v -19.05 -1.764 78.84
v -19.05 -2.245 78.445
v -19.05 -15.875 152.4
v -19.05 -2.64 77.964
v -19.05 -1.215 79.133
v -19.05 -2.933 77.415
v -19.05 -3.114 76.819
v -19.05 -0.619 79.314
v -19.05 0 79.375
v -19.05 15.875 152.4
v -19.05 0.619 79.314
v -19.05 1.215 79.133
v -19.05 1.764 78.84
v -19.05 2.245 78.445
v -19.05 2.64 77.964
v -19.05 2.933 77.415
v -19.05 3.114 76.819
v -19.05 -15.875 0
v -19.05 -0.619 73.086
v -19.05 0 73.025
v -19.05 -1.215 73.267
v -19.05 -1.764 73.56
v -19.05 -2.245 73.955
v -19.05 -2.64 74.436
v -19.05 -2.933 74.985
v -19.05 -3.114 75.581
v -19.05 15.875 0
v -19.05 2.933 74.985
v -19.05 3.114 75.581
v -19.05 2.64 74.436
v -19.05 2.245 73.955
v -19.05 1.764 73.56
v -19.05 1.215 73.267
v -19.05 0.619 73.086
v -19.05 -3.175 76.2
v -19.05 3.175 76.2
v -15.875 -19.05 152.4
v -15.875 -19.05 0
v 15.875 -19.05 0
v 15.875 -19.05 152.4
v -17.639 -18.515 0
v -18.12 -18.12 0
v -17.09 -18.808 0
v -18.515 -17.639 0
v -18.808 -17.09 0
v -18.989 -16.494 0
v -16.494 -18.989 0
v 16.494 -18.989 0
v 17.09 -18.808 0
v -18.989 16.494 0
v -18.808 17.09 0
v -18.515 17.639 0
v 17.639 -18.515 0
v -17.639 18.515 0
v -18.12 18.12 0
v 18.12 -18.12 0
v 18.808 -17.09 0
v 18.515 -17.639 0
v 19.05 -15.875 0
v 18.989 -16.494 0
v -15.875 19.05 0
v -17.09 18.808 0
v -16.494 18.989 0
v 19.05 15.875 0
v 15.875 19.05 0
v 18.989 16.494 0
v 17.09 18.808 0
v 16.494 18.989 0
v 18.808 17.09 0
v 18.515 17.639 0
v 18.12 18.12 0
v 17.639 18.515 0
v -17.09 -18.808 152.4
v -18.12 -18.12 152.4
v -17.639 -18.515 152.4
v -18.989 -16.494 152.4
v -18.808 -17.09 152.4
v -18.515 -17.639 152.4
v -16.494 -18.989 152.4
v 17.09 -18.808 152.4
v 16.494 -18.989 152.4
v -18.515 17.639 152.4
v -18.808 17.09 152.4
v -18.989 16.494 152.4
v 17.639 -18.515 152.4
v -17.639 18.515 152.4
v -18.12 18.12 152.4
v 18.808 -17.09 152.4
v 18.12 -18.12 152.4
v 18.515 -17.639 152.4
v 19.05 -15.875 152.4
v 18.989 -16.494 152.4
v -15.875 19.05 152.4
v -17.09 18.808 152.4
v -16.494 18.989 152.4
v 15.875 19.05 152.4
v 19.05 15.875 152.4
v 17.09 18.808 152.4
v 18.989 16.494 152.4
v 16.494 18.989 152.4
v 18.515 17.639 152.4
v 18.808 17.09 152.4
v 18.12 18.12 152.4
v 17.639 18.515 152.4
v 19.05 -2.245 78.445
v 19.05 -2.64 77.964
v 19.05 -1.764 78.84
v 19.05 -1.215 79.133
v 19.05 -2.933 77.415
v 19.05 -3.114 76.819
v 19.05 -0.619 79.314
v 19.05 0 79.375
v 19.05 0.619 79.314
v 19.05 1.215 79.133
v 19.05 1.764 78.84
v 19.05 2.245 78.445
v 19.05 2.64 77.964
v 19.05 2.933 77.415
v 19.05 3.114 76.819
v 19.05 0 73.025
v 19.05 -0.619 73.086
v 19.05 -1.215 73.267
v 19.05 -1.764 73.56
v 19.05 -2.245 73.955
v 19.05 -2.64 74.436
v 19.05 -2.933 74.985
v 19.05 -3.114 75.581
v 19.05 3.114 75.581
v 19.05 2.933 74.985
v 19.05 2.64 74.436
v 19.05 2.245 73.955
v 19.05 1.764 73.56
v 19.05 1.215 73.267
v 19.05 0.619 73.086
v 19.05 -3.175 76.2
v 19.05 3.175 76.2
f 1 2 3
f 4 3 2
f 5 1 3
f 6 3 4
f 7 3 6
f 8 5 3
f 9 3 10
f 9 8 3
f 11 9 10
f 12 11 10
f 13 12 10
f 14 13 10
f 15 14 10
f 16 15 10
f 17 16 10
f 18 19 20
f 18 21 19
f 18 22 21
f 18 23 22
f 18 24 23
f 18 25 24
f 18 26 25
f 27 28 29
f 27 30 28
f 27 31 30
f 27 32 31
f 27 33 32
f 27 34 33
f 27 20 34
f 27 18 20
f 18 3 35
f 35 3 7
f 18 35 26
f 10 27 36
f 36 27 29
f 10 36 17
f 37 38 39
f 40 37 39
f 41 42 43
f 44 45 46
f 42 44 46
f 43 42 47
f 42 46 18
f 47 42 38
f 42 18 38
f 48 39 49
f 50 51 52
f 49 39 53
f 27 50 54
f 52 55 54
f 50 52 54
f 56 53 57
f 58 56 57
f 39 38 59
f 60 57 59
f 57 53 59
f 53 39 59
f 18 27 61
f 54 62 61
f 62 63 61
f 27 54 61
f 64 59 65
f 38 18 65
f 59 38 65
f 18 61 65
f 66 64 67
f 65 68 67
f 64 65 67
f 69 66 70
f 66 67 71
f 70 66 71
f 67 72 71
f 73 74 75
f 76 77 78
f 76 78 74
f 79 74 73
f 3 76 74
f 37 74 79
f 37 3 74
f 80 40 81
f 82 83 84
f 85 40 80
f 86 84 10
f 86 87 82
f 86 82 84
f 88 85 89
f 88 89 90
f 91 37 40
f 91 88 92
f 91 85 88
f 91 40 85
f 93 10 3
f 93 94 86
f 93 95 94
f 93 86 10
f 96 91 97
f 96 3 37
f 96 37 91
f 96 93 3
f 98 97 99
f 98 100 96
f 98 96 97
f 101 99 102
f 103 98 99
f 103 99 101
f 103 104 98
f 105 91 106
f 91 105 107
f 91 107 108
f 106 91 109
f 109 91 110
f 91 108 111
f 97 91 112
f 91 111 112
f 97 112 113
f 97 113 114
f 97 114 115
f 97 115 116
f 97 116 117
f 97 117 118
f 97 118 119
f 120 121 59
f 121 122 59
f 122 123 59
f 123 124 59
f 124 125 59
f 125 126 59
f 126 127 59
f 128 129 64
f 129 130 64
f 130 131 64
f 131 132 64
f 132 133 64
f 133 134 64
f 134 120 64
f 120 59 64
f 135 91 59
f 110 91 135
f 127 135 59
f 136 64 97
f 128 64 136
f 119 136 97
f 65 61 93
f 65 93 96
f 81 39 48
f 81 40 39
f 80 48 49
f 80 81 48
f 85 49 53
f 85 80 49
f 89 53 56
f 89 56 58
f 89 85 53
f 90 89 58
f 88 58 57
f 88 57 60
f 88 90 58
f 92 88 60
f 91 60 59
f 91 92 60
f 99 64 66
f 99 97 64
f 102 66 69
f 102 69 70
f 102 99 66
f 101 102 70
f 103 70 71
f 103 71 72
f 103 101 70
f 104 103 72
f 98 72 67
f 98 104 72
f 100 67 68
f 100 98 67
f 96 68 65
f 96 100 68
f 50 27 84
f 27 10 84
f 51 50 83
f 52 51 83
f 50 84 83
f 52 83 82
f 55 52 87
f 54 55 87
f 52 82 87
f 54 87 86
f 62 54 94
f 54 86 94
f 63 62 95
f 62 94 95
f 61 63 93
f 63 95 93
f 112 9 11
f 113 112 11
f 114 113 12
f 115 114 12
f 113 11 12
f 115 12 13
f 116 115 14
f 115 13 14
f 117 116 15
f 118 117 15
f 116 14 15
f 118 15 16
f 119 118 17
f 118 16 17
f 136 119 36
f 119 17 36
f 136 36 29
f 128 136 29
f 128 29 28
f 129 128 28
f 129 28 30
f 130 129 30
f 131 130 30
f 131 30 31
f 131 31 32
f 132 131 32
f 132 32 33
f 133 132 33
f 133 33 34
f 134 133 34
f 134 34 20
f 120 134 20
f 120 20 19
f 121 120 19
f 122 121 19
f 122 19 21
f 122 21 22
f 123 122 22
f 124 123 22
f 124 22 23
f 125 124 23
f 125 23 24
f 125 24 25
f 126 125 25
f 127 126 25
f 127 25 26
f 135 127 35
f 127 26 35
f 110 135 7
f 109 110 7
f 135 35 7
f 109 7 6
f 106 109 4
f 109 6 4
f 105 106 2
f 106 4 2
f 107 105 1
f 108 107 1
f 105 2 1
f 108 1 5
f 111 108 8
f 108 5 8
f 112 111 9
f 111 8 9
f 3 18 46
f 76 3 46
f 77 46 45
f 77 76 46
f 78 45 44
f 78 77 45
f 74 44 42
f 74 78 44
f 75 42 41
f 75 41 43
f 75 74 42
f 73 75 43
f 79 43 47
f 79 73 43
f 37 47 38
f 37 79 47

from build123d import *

# Parameters (mm, degrees)
SKETCH1_W           = 38.1
SKETCH1_H           = 38.1
BOSS_EXTRUDE1_DEPTH = 152.4
FILLET1_R           = 3.175
SKETCH2_R           = 3.175
CUT_EXTRUDE1_DEPTH  = 159.241184589


with BuildPart() as part:
    # Sketch1 → Boss-Extrude1 (new body)
    with BuildSketch(Plane.XY):
        Rectangle(SKETCH1_W, SKETCH1_H)
    extrude(amount=BOSS_EXTRUDE1_DEPTH)

    # Fillet1
    fillet1_edges = [part.edges().sort_by_distance(p)[0] for p in [
        (19.05, -19.05, 76.2),
        (-19.05, -19.05, 76.2),
        (-19.05, 19.05, 76.2),
        (19.05, 19.05, 76.2),
    ]]
    fillet(fillet1_edges, radius=FILLET1_R)

    # Sketch2 → Cut-Extrude1 (cut, through all)
    with BuildSketch(Plane.ZY.offset(19.05)):
        with Locations((76.2, 0)):
            Circle(SKETCH2_R)
    extrude(amount=-CUT_EXTRUDE1_DEPTH, mode=Mode.SUBTRACT)


solid = part.part
